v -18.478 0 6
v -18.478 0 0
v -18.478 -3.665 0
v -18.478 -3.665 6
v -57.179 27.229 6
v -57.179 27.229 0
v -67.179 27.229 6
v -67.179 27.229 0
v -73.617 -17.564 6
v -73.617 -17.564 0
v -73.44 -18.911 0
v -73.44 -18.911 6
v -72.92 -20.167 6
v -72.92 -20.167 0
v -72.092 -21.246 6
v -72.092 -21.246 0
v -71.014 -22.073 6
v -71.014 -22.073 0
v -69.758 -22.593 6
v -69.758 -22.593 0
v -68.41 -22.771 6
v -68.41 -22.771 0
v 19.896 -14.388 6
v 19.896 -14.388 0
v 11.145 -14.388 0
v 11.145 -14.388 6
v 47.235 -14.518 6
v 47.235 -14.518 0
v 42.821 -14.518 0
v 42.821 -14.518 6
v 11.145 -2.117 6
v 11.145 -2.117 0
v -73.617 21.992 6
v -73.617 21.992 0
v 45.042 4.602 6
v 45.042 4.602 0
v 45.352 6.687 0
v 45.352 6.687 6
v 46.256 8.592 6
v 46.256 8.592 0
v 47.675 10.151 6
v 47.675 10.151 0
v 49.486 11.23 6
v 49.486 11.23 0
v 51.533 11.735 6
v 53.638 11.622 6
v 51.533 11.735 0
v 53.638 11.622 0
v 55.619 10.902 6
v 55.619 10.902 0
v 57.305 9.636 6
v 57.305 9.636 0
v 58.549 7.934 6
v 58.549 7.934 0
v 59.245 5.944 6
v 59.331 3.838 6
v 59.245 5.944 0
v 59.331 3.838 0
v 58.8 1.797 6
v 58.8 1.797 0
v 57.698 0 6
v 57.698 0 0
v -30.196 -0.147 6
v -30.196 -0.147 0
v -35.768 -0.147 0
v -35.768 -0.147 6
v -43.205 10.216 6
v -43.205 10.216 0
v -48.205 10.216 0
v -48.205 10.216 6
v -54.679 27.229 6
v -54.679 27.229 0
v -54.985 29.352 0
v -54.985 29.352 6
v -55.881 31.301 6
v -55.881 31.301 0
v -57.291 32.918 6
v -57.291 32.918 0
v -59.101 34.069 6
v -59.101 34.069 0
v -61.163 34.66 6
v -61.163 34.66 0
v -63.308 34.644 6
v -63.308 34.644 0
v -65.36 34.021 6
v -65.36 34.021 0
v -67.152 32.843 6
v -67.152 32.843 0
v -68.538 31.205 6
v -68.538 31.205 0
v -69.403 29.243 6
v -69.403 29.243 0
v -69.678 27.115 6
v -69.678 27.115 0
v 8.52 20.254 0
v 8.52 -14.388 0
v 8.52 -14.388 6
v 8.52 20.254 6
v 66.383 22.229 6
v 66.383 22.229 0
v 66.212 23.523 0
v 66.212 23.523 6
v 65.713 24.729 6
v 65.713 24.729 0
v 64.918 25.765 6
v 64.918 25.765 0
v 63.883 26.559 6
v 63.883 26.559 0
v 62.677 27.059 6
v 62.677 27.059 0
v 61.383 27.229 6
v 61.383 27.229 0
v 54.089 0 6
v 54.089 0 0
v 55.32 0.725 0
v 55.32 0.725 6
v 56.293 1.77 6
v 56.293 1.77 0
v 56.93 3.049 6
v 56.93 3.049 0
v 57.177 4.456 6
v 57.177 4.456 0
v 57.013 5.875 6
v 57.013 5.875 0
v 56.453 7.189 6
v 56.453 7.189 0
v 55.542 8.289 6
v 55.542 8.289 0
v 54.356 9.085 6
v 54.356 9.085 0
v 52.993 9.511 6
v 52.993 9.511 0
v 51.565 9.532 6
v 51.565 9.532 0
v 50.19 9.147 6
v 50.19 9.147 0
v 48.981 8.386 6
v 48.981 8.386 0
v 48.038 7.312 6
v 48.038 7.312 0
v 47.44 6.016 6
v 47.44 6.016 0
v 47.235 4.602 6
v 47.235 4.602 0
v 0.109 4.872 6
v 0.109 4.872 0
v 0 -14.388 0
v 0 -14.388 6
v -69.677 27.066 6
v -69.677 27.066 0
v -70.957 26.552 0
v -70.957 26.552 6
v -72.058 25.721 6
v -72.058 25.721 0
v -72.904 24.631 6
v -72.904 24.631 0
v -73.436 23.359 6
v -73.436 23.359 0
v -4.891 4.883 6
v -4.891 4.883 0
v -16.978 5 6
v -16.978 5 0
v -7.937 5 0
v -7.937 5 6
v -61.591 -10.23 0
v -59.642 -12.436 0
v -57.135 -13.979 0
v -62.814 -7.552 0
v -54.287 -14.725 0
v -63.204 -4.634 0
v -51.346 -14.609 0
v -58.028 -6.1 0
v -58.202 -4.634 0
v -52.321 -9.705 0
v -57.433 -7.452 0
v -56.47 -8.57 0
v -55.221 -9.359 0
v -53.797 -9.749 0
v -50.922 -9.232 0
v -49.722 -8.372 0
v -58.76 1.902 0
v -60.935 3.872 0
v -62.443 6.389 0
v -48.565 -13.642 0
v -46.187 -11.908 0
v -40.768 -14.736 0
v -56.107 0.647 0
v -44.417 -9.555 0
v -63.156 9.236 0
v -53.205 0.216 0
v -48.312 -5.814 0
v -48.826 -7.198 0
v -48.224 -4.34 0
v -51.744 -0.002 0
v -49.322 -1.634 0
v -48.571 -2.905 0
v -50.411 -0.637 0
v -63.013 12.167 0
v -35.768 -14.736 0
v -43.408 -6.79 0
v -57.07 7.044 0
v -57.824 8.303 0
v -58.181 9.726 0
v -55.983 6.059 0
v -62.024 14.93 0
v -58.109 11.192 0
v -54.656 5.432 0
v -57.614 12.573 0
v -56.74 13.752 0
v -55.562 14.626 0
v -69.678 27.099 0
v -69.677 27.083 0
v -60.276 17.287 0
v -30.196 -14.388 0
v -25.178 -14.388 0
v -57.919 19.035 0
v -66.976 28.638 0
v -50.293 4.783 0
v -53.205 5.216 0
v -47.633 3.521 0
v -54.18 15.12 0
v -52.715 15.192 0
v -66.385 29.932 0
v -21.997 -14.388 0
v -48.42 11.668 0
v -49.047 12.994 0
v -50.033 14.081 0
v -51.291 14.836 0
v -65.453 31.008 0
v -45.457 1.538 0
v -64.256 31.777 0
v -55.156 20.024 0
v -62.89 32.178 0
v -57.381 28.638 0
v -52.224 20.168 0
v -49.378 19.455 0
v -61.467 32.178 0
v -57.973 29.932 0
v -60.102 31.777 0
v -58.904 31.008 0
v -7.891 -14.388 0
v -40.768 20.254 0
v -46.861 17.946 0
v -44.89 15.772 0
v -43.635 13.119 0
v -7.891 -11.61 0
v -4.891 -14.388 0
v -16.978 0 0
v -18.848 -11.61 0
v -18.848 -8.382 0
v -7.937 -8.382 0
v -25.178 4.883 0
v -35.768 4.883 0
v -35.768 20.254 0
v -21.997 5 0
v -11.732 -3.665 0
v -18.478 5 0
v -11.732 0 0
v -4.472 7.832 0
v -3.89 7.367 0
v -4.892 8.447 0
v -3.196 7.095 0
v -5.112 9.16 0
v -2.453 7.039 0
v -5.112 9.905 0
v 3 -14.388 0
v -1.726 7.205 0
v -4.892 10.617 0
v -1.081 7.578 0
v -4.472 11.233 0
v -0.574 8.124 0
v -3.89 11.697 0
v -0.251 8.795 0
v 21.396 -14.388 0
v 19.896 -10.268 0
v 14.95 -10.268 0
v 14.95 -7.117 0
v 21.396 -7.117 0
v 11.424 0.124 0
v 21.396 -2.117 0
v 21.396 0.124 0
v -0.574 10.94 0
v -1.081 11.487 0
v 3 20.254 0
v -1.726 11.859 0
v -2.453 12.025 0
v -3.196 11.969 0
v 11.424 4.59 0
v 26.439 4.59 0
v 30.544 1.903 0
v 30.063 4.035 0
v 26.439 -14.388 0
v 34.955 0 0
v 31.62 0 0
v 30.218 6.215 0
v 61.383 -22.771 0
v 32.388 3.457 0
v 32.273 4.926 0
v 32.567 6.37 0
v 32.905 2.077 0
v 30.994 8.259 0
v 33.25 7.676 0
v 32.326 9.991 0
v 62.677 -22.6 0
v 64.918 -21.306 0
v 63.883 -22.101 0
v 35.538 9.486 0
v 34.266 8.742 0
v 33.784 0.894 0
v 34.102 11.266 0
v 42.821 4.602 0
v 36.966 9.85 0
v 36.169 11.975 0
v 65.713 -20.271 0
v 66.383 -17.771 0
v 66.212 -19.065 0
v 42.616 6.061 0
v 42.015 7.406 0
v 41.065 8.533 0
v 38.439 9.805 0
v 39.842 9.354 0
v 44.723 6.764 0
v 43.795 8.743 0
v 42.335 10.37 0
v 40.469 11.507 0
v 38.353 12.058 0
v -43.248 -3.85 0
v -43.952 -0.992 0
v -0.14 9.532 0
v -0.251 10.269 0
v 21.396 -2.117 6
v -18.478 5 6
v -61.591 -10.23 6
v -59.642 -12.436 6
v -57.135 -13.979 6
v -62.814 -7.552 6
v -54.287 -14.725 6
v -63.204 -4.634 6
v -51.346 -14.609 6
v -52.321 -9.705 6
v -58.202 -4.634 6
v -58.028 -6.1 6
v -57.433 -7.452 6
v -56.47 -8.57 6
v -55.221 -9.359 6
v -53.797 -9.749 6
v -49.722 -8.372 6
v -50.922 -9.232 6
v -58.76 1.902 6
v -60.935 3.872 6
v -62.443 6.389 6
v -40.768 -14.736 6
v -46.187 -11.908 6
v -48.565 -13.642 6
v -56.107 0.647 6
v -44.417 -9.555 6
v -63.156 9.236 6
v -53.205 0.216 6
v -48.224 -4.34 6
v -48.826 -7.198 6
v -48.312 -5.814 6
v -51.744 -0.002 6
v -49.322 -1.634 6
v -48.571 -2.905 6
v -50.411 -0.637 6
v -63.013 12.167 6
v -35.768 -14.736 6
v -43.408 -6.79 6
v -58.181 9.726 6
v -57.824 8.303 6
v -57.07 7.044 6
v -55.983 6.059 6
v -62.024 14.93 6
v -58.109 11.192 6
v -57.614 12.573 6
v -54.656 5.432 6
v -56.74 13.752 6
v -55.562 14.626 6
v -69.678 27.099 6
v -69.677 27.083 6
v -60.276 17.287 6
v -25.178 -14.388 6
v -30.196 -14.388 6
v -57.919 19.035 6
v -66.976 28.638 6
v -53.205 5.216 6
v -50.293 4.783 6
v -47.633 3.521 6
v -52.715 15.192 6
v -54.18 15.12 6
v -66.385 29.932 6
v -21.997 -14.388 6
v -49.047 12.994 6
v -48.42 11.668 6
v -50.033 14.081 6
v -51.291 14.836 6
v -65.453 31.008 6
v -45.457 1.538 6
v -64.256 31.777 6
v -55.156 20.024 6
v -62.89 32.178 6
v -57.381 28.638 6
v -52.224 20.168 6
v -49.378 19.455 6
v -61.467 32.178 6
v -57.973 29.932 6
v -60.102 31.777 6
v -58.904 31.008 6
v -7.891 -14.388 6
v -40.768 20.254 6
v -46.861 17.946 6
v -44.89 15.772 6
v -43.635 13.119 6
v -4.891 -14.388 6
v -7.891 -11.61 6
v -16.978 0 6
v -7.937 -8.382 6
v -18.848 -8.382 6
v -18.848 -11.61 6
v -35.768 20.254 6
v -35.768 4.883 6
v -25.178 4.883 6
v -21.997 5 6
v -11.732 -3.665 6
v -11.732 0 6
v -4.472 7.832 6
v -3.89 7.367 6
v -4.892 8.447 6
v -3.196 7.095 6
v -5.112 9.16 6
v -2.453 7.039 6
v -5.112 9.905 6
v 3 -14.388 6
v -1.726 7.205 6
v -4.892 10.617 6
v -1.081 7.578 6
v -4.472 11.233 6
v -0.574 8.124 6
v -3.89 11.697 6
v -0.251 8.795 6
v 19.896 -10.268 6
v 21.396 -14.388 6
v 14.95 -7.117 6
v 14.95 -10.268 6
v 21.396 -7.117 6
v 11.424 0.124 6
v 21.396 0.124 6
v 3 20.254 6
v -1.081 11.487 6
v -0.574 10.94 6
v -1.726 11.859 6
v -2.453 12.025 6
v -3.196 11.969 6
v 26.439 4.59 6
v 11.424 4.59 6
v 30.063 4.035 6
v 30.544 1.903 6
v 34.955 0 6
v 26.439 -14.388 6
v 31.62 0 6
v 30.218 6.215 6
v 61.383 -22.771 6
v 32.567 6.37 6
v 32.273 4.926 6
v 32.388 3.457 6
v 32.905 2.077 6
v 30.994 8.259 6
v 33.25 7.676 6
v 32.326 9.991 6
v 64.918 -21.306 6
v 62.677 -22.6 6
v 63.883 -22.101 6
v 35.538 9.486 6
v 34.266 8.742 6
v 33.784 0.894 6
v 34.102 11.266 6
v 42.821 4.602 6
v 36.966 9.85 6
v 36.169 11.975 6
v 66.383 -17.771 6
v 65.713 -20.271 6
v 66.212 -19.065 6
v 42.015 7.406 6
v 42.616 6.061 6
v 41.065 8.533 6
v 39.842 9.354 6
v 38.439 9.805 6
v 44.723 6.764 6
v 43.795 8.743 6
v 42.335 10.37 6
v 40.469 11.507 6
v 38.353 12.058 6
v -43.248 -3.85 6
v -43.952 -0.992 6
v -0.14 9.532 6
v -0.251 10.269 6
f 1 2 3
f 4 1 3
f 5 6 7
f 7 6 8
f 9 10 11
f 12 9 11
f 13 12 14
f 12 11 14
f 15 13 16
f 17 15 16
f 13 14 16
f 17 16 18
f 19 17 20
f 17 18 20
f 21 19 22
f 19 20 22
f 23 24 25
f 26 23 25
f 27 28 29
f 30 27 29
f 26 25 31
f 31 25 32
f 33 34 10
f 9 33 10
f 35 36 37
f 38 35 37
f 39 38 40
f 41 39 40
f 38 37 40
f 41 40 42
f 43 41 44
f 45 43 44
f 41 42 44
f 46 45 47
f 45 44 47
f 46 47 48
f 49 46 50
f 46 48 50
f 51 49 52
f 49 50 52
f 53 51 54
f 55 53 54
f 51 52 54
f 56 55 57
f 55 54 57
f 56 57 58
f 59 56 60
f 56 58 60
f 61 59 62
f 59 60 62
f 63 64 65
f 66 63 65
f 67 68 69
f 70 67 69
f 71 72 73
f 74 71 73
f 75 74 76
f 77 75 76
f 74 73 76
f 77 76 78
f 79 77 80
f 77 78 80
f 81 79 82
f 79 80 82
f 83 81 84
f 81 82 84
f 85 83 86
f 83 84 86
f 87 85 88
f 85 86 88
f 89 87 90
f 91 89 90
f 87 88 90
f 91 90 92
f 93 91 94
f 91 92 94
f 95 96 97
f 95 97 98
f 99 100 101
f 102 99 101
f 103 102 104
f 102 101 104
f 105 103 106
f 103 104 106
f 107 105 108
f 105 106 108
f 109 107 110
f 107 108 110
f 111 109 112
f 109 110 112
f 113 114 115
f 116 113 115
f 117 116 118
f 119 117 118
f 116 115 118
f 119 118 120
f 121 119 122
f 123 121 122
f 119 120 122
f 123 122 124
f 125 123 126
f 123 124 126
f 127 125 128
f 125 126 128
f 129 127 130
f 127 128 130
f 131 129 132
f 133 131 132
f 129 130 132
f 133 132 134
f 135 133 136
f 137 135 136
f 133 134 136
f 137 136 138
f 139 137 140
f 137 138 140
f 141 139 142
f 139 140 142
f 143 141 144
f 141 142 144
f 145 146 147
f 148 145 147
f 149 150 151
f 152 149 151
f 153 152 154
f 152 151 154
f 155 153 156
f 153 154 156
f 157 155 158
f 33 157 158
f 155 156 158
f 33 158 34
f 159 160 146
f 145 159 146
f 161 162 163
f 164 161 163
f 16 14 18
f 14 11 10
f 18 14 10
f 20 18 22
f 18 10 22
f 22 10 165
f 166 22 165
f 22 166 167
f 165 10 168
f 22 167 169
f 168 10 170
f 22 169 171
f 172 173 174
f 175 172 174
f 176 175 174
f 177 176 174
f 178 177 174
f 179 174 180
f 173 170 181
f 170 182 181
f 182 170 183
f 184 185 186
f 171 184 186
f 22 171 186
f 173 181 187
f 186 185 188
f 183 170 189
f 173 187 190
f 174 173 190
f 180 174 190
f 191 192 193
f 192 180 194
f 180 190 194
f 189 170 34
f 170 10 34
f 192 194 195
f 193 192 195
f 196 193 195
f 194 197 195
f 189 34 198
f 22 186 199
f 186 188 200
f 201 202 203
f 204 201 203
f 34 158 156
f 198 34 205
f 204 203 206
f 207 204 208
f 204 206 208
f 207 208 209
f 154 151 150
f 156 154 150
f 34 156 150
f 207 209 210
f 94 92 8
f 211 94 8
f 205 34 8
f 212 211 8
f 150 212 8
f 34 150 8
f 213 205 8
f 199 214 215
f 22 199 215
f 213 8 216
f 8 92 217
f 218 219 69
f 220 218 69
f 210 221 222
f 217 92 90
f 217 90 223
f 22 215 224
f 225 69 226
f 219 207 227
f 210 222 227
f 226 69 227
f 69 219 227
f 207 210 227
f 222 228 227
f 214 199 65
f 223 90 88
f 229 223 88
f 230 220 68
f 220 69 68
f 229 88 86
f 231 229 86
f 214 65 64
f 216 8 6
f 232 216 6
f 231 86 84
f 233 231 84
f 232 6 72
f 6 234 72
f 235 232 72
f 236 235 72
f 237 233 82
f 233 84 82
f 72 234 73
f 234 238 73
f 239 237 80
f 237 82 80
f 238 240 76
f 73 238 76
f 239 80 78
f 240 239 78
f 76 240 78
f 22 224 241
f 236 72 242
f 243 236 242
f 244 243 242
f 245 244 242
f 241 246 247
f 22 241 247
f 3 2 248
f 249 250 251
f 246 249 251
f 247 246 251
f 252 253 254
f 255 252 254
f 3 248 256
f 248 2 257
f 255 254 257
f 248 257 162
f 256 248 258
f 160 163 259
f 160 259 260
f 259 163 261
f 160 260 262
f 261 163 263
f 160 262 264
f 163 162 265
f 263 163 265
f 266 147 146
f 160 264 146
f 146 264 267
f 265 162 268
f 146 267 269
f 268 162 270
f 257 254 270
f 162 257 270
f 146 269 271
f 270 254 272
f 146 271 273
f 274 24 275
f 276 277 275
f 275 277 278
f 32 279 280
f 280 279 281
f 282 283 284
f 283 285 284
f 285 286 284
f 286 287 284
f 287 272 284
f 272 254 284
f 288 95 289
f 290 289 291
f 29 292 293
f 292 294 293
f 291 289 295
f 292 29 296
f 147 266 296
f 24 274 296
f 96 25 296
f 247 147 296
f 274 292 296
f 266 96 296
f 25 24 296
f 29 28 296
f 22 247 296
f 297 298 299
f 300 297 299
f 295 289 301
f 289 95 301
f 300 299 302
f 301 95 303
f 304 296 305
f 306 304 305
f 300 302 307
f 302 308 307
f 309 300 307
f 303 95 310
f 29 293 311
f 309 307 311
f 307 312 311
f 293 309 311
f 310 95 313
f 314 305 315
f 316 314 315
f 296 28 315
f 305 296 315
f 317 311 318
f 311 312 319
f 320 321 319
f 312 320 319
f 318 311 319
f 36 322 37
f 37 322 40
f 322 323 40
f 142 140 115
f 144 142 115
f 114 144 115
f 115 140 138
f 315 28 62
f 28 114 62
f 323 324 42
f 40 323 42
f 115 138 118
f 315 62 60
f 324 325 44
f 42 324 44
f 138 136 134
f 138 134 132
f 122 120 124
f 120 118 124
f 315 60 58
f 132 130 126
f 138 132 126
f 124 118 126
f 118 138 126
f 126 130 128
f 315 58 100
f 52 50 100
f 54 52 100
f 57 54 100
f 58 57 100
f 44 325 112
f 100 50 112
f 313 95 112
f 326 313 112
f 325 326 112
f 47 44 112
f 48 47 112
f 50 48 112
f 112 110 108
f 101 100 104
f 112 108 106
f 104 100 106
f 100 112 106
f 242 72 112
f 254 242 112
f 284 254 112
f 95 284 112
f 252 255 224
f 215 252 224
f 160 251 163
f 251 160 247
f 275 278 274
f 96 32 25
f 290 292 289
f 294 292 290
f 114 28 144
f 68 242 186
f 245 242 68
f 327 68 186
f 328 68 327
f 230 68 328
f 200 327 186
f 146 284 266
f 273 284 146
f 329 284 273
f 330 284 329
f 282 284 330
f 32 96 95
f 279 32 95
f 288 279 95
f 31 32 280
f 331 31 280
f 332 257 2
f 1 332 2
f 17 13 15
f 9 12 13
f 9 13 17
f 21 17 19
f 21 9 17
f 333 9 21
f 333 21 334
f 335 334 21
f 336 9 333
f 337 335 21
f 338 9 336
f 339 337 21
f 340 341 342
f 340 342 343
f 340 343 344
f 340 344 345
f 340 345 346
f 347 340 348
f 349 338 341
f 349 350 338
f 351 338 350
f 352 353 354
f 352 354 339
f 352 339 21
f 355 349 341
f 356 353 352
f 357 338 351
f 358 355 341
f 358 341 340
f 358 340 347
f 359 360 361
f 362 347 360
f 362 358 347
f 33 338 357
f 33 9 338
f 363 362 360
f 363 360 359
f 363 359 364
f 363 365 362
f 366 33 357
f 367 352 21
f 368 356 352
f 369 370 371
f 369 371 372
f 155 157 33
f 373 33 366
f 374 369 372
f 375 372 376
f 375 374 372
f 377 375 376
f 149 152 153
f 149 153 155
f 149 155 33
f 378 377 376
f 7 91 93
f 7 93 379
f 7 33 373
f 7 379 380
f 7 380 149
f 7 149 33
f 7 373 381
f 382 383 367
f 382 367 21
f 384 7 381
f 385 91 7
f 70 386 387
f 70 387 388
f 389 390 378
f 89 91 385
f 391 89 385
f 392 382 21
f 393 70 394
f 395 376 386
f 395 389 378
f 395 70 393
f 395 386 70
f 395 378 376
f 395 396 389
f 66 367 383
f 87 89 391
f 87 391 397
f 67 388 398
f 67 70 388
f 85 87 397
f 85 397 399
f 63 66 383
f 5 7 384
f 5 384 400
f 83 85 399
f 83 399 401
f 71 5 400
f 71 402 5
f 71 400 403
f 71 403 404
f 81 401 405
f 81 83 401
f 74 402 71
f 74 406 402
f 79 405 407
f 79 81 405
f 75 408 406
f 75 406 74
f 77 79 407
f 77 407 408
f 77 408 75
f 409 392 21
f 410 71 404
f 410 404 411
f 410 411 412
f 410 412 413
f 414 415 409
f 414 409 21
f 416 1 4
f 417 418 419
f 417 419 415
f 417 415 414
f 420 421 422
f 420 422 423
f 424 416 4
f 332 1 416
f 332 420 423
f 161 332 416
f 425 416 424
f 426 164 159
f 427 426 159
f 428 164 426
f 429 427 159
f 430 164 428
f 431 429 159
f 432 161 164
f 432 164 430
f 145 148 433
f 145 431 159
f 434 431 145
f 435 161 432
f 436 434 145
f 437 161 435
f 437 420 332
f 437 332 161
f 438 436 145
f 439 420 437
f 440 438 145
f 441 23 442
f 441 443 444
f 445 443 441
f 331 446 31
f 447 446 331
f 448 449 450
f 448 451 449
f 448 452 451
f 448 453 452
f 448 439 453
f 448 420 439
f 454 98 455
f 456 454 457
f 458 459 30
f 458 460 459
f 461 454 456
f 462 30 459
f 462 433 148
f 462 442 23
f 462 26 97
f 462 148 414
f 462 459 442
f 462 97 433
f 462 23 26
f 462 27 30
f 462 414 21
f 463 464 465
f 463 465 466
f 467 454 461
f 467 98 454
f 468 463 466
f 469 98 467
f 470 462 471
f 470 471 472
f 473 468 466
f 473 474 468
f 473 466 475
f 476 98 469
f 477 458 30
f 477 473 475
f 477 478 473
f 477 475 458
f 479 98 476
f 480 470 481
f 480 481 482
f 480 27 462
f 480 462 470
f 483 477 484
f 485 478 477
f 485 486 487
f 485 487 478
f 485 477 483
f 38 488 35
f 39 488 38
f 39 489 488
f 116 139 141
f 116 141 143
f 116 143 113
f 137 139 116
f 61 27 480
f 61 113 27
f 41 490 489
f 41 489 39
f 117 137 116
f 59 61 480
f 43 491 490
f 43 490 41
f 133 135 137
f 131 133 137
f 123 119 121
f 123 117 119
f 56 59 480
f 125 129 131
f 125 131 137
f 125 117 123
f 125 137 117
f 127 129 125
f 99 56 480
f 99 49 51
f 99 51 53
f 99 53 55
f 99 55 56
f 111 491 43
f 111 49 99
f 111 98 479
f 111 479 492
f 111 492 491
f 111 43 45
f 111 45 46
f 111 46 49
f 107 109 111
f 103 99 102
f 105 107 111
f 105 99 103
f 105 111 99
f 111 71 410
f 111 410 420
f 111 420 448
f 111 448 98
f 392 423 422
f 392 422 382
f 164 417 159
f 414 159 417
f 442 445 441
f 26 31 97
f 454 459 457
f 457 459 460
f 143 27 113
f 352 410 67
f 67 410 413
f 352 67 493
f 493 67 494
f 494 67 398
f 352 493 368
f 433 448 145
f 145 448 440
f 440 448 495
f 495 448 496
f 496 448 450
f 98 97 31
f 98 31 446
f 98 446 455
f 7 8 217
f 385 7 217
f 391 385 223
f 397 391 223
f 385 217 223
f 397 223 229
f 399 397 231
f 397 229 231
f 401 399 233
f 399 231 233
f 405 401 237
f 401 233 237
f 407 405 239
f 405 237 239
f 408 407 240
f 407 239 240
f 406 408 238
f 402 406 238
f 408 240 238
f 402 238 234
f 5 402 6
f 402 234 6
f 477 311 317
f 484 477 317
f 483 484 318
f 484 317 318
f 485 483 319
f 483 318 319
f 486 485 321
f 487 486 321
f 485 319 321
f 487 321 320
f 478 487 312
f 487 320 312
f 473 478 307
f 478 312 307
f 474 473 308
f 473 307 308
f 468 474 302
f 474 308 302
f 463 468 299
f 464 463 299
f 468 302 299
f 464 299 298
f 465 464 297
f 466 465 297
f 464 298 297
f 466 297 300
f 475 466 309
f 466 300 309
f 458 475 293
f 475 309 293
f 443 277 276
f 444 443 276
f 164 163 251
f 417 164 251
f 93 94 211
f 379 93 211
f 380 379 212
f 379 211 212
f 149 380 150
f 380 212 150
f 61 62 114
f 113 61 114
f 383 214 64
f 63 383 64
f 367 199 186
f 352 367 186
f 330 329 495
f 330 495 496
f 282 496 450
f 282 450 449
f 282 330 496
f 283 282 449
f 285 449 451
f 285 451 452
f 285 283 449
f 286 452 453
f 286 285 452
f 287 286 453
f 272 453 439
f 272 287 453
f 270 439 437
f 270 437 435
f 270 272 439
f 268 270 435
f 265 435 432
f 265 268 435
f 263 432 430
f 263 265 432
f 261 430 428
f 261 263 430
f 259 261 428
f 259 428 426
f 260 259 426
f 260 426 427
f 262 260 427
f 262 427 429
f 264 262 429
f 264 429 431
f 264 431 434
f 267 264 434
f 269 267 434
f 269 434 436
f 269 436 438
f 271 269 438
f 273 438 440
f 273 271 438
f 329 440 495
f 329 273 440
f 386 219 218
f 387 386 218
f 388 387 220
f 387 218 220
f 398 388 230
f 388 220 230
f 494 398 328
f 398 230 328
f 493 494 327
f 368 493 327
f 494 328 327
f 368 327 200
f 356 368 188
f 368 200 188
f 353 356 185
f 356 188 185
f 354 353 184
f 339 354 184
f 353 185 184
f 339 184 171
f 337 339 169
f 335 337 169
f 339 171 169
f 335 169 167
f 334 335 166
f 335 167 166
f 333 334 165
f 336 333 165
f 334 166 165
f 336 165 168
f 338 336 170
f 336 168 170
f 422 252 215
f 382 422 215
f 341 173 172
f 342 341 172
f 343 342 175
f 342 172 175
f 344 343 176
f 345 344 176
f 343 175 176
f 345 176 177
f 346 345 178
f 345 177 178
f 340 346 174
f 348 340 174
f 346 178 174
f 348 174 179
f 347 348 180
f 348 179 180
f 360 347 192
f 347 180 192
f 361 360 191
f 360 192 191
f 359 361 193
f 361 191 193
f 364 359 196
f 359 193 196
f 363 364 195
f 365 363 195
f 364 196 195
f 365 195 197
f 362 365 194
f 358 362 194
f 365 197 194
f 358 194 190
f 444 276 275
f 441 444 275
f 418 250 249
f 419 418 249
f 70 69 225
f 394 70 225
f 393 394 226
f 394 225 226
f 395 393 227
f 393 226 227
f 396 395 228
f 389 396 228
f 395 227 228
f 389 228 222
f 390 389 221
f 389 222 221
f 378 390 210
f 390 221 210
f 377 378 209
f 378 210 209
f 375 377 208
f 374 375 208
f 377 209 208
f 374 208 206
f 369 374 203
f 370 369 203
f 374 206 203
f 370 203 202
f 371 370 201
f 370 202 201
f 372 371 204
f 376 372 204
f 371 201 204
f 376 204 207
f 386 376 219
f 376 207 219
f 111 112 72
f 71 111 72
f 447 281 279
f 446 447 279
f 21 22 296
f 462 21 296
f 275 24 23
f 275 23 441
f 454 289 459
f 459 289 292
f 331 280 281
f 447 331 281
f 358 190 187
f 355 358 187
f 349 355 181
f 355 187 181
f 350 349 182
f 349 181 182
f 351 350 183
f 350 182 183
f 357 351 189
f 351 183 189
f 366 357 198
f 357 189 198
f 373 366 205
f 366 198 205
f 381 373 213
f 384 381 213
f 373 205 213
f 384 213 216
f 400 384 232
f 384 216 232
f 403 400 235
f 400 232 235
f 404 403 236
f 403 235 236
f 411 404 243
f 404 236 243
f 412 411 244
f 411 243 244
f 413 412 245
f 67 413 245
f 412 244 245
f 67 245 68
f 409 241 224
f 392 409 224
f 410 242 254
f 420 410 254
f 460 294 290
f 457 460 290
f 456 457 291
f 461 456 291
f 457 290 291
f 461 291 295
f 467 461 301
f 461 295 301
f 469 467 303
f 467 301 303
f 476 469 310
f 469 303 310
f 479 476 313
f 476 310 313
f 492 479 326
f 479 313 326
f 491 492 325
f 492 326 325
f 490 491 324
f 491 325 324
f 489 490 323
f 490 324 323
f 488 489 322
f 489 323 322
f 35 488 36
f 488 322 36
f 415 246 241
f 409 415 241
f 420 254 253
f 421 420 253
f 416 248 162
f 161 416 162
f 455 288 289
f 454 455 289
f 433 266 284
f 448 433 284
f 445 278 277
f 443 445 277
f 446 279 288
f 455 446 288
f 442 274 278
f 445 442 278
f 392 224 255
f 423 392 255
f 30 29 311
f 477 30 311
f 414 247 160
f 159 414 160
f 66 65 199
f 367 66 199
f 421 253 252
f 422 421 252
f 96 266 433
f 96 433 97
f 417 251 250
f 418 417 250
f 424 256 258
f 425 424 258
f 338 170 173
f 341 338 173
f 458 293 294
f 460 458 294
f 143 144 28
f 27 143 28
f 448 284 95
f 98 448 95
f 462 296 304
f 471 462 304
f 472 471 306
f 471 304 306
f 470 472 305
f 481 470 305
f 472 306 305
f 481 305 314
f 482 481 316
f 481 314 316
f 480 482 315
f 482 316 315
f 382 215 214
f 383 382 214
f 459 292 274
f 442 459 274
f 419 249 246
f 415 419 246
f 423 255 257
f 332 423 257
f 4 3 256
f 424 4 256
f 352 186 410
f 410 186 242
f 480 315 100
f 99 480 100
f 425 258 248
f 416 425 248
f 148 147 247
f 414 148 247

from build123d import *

# Parameters (mm, degrees)
F0_W     = 5.5195543896
F0_H     = 34.641196678
F0_R     = 2.5
F0_W_2   = 1.4996174723
F0_H_2   = 4.8834816366
F0_W_3   = 1.5
F0_H_3   = 4.1201120429
F0_H_4   = 0.1165183634
F1_DEPTH = 6


# Not quite as in the source:
# - a feature names something its author has since deleted; it is built from what else it names


with BuildPart() as f1:
    # F0 (on Top) → F1 (new body)
    with BuildSketch(Plane.XY):
        with BuildLine():
            Line((-67.1787756681, 27.2292699475), (-68.3799158582, 27.2292699475))
            ThreePointArc((-68.3799158582, 27.2292699475), (-69.0335690068, 27.1883203713), (-69.6770007567, 27.0661119853))
            ThreePointArc((-69.6770007567, 27.0661119853), (-72.5165696868, 25.2041102534), (-73.6173242331, 21.9918615726))
            Line((-73.6173242331, 21.9918615726), (-73.6173242331, -17.563536772))
            ThreePointArc((-73.6173242331, -17.563536772), (-72.0921726321, -21.2455784516), (-68.4101309525, -22.7707300525))
            Line((-68.4101309525, -22.7707300525), (61.3826757669, -22.7707300525))
            ThreePointArc((61.3826757669, -22.7707300525), (64.9182096729, -21.3062639585), (66.3826757669, -17.7707300525))
            Line((66.3826757669, -17.7707300525), (66.3826757669, 22.2292699475))
            ThreePointArc((66.3826757669, 22.2292699475), (64.9182096729, 25.7648038534), (61.3826757669, 27.2292699475))
            Line((61.3826757669, 27.2292699475), (-54.6787756681, 27.2292699475))
            Line((-54.6787756681, 27.2292699475), (-57.1787756681, 27.2292699475))
            Line((-57.1787756681, 27.2292699475), (-67.1787756681, 27.2292699475))
        make_face()
        with BuildLine():
            ThreePointArc((-68.3379918337, 19.7292699475), (-67.6057587867, 21.4970369004), (-65.8379918337, 22.2292699475))
            Line((-65.8379918337, 22.2292699475), (58.8826757669, 22.2292699475))
            ThreePointArc((58.8826757669, 22.2292699475), (60.6504427199, 21.4970369004), (61.3826757669, 19.7292699475))
            Line((61.3826757669, 19.7292699475), (61.3826757669, -15.2707300525))
            ThreePointArc((61.3826757669, -15.2707300525), (60.6504427199, -17.0384970055), (58.8826757669, -17.7707300525))
            Line((58.8826757669, -17.7707300525), (-65.8379918337, -17.7707300525))
            ThreePointArc((-65.8379918337, -17.7707300525), (-67.6057587867, -17.0384970055), (-68.3379918337, -15.2707300525))
            Line((-68.3379918337, -15.2707300525), (-68.3379918337, 19.7292699475))
        make_face(mode=Mode.SUBTRACT)
        with BuildLine():
            Line((58.8826757669, 22.2292699475), (-65.8379918337, 22.2292699475))
            ThreePointArc((-65.8379918337, 22.2292699475), (-67.6057587867, 21.4970369004), (-68.3379918337, 19.7292699475))
            Line((-68.3379918337, 19.7292699475), (-68.3379918337, -15.2707300525))
            ThreePointArc((-68.3379918337, -15.2707300525), (-67.6057587867, -17.0384970055), (-65.8379918337, -17.7707300525))
            Line((-65.8379918337, -17.7707300525), (58.8826757669, -17.7707300525))
            ThreePointArc((58.8826757669, -17.7707300525), (60.6504427199, -17.0384970055), (61.3826757669, -15.2707300525))
            Line((61.3826757669, -15.2707300525), (61.3826757669, 19.7292699475))
            ThreePointArc((61.3826757669, 19.7292699475), (60.6504427199, 21.4970369004), (58.8826757669, 22.2292699475))
        make_face()
        with BuildLine():
            ThreePointArc((-53.204651922, 0.2162606642), (-60.2757197339, 17.287328476), (-43.204651922, 10.2162606642))
            Line((-43.204651922, 10.2162606642), (-48.204651922, 10.2162606642))
            ThreePointArc((-48.204651922, 10.2162606642), (-56.7401858279, 13.7517945701), (-53.204651922, 5.2162606642))
            ThreePointArc((-53.204651922, 5.2162606642), (-46.1867208519, -11.9075475516), (-63.203530925, -4.6340106369))
            Line((-63.203530925, -4.6340106369), (-58.2024095508, -4.6340106369))
            ThreePointArc((-58.2024095508, -4.6340106369), (-49.7224574627, -8.371819846), (-53.204651922, 0.2162606642))
        make_face(mode=Mode.SUBTRACT)
        Polygon((-7.8910876493, -14.387637473), (-21.9972077757, -14.387637473), (-21.9972077757, 4.8834816366), (-21.9972077757, 5), (-18.4776540846, 5), (-16.9780366123, 5), (-7.9369102418, 5), (-7.9369102418, 4.8834816366), (-7.9369102418, -8.3816020689), (-18.8480350176, -8.3816020689), (-18.8480350176, -11.6097754424), (-7.8910876493, -11.6097754424), align=None, mode=Mode.SUBTRACT)
        Polygon((-40.7681576908, -14.7364697516), (-40.7681576908, 20.253559205), (-35.7681576908, 20.253559205), (-35.7681576908, 4.8834816366), (-25.1815660298, 4.8834816366), (-25.1776284749, 4.8834816366), (-25.1776284749, -14.387637473), (-30.1955331862, -14.387637473), (-30.1955331862, -0.1466480026), (-35.7681576908, -0.1466480026), (-35.7681576908, -14.7364697516), align=None, mode=Mode.SUBTRACT)
        Polygon((0, -14.387637473), (-4.8910876493, -14.387637473), (-4.8910876493, 4.8834816366), (0.1088994695, 4.8721321267), align=None, mode=Mode.SUBTRACT)
        Polygon((19.8960285634, -14.387637473), (11.1452508718, -14.387637473), (11.1452508718, -2.1165183634), (21.3960285634, -2.1165183634), (21.3960285634, 0.1236622645), (11.4239600822, 0.1236622645), (11.4239600822, 4.5901425229), (26.3825752896, 4.5901425229), (26.4385476336, 4.5901425229), (26.4385476336, -14.387637473), (21.3960285634, -14.387637473), align=None, mode=Mode.SUBTRACT)
        with Locations((5.7597771948, 2.932960866)):
            Rectangle(F0_W, F0_H, mode=Mode.SUBTRACT)
        with BuildLine():
            Line((47.2346405685, -14.5181566477), (42.8212322295, -14.5181566477))
            Line((42.8212322295, -14.5181566477), (42.8212322295, 4.6019549295))
            ThreePointArc((42.8212322295, 4.6019549295), (34.8761091537, 9.1588015867), (34.9547580095, 0))
            Line((34.9547580095, 0), (31.6197408739, 0))
            ThreePointArc((31.6197408739, 0), (35.1094377398, 11.6965380784), (45.0419035554, 4.6019549295))
            ThreePointArc((45.0419035554, 4.6019549295), (54.6550720871, 11.3354460366), (57.6981913518, 0))
            Line((57.6981913518, 0), (54.089111107, 0))
            ThreePointArc((54.089111107, 0), (54.9781676596, 8.7299615773), (47.2346405685, 4.6019549295))
            Line((47.2346405685, 4.6019549295), (47.2346405685, -14.5181566477))
        make_face(mode=Mode.SUBTRACT)
        with Locations((-2.6396652684, 9.5321238041)):
            Circle(F0_R, mode=Mode.SUBTRACT)
        with BuildLine():
            Line((-68.6173242331, 27.2292699475), (-68.3799158582, 27.2292699475))
            Line((-68.3799158582, 27.2292699475), (-67.1787756681, 27.2292699475))
            ThreePointArc((-67.1787756681, 27.2292699475), (-62.1787756681, 32.2292699475), (-57.1787756681, 27.2292699475))
            Line((-57.1787756681, 27.2292699475), (-54.6787756681, 27.2292699475))
            ThreePointArc((-54.6787756681, 27.2292699475), (-62.2356669727, 34.7290541697), (-69.6779125693, 27.1154906119))
            ThreePointArc((-69.6779125693, 27.1154906119), (-69.1506612176, 27.2007437391), (-68.6173242331, 27.2292699475))
        make_face()
        Polygon((-16.9780366123, 0), (-18.4776540846, 0), (-18.4776540846, -3.6654266296), (-11.7318434641, -3.6654266296), (-11.7318434641, 0), align=None)
        Polygon((14.9498761296, -10.2675254301), (19.8960285634, -10.2675254301), (21.3960285634, -10.2675254301), (21.3960285634, -7.1165183634), (14.9498761296, -7.1165183634), align=None)
        with Locations((-17.7278453484, 2.4417408183)):
            Rectangle(F0_W_2, F0_H_2)
        with Locations((20.6460285634, -12.3275814516)):
            Rectangle(F0_W_3, F0_H_3)
        with Locations((-17.7278453484, 4.9417408183)):
            Rectangle(F0_W_2, F0_H_4)
        with BuildLine():
            ThreePointArc((-69.6770007567, 27.0661119853), (-69.0335690068, 27.1883203713), (-68.3799158582, 27.2292699475))
            Line((-68.3799158582, 27.2292699475), (-68.6173242331, 27.2292699475))
            ThreePointArc((-68.6173242331, 27.2292699475), (-69.1506612176, 27.2007437391), (-69.6779125693, 27.1154906119))
            ThreePointArc((-69.6779125693, 27.1154906119), (-69.6774973076, 27.0908005481), (-69.6770007567, 27.0661119853))
        make_face()
    extrude(amount=F1_DEPTH)


solid = f1.part
